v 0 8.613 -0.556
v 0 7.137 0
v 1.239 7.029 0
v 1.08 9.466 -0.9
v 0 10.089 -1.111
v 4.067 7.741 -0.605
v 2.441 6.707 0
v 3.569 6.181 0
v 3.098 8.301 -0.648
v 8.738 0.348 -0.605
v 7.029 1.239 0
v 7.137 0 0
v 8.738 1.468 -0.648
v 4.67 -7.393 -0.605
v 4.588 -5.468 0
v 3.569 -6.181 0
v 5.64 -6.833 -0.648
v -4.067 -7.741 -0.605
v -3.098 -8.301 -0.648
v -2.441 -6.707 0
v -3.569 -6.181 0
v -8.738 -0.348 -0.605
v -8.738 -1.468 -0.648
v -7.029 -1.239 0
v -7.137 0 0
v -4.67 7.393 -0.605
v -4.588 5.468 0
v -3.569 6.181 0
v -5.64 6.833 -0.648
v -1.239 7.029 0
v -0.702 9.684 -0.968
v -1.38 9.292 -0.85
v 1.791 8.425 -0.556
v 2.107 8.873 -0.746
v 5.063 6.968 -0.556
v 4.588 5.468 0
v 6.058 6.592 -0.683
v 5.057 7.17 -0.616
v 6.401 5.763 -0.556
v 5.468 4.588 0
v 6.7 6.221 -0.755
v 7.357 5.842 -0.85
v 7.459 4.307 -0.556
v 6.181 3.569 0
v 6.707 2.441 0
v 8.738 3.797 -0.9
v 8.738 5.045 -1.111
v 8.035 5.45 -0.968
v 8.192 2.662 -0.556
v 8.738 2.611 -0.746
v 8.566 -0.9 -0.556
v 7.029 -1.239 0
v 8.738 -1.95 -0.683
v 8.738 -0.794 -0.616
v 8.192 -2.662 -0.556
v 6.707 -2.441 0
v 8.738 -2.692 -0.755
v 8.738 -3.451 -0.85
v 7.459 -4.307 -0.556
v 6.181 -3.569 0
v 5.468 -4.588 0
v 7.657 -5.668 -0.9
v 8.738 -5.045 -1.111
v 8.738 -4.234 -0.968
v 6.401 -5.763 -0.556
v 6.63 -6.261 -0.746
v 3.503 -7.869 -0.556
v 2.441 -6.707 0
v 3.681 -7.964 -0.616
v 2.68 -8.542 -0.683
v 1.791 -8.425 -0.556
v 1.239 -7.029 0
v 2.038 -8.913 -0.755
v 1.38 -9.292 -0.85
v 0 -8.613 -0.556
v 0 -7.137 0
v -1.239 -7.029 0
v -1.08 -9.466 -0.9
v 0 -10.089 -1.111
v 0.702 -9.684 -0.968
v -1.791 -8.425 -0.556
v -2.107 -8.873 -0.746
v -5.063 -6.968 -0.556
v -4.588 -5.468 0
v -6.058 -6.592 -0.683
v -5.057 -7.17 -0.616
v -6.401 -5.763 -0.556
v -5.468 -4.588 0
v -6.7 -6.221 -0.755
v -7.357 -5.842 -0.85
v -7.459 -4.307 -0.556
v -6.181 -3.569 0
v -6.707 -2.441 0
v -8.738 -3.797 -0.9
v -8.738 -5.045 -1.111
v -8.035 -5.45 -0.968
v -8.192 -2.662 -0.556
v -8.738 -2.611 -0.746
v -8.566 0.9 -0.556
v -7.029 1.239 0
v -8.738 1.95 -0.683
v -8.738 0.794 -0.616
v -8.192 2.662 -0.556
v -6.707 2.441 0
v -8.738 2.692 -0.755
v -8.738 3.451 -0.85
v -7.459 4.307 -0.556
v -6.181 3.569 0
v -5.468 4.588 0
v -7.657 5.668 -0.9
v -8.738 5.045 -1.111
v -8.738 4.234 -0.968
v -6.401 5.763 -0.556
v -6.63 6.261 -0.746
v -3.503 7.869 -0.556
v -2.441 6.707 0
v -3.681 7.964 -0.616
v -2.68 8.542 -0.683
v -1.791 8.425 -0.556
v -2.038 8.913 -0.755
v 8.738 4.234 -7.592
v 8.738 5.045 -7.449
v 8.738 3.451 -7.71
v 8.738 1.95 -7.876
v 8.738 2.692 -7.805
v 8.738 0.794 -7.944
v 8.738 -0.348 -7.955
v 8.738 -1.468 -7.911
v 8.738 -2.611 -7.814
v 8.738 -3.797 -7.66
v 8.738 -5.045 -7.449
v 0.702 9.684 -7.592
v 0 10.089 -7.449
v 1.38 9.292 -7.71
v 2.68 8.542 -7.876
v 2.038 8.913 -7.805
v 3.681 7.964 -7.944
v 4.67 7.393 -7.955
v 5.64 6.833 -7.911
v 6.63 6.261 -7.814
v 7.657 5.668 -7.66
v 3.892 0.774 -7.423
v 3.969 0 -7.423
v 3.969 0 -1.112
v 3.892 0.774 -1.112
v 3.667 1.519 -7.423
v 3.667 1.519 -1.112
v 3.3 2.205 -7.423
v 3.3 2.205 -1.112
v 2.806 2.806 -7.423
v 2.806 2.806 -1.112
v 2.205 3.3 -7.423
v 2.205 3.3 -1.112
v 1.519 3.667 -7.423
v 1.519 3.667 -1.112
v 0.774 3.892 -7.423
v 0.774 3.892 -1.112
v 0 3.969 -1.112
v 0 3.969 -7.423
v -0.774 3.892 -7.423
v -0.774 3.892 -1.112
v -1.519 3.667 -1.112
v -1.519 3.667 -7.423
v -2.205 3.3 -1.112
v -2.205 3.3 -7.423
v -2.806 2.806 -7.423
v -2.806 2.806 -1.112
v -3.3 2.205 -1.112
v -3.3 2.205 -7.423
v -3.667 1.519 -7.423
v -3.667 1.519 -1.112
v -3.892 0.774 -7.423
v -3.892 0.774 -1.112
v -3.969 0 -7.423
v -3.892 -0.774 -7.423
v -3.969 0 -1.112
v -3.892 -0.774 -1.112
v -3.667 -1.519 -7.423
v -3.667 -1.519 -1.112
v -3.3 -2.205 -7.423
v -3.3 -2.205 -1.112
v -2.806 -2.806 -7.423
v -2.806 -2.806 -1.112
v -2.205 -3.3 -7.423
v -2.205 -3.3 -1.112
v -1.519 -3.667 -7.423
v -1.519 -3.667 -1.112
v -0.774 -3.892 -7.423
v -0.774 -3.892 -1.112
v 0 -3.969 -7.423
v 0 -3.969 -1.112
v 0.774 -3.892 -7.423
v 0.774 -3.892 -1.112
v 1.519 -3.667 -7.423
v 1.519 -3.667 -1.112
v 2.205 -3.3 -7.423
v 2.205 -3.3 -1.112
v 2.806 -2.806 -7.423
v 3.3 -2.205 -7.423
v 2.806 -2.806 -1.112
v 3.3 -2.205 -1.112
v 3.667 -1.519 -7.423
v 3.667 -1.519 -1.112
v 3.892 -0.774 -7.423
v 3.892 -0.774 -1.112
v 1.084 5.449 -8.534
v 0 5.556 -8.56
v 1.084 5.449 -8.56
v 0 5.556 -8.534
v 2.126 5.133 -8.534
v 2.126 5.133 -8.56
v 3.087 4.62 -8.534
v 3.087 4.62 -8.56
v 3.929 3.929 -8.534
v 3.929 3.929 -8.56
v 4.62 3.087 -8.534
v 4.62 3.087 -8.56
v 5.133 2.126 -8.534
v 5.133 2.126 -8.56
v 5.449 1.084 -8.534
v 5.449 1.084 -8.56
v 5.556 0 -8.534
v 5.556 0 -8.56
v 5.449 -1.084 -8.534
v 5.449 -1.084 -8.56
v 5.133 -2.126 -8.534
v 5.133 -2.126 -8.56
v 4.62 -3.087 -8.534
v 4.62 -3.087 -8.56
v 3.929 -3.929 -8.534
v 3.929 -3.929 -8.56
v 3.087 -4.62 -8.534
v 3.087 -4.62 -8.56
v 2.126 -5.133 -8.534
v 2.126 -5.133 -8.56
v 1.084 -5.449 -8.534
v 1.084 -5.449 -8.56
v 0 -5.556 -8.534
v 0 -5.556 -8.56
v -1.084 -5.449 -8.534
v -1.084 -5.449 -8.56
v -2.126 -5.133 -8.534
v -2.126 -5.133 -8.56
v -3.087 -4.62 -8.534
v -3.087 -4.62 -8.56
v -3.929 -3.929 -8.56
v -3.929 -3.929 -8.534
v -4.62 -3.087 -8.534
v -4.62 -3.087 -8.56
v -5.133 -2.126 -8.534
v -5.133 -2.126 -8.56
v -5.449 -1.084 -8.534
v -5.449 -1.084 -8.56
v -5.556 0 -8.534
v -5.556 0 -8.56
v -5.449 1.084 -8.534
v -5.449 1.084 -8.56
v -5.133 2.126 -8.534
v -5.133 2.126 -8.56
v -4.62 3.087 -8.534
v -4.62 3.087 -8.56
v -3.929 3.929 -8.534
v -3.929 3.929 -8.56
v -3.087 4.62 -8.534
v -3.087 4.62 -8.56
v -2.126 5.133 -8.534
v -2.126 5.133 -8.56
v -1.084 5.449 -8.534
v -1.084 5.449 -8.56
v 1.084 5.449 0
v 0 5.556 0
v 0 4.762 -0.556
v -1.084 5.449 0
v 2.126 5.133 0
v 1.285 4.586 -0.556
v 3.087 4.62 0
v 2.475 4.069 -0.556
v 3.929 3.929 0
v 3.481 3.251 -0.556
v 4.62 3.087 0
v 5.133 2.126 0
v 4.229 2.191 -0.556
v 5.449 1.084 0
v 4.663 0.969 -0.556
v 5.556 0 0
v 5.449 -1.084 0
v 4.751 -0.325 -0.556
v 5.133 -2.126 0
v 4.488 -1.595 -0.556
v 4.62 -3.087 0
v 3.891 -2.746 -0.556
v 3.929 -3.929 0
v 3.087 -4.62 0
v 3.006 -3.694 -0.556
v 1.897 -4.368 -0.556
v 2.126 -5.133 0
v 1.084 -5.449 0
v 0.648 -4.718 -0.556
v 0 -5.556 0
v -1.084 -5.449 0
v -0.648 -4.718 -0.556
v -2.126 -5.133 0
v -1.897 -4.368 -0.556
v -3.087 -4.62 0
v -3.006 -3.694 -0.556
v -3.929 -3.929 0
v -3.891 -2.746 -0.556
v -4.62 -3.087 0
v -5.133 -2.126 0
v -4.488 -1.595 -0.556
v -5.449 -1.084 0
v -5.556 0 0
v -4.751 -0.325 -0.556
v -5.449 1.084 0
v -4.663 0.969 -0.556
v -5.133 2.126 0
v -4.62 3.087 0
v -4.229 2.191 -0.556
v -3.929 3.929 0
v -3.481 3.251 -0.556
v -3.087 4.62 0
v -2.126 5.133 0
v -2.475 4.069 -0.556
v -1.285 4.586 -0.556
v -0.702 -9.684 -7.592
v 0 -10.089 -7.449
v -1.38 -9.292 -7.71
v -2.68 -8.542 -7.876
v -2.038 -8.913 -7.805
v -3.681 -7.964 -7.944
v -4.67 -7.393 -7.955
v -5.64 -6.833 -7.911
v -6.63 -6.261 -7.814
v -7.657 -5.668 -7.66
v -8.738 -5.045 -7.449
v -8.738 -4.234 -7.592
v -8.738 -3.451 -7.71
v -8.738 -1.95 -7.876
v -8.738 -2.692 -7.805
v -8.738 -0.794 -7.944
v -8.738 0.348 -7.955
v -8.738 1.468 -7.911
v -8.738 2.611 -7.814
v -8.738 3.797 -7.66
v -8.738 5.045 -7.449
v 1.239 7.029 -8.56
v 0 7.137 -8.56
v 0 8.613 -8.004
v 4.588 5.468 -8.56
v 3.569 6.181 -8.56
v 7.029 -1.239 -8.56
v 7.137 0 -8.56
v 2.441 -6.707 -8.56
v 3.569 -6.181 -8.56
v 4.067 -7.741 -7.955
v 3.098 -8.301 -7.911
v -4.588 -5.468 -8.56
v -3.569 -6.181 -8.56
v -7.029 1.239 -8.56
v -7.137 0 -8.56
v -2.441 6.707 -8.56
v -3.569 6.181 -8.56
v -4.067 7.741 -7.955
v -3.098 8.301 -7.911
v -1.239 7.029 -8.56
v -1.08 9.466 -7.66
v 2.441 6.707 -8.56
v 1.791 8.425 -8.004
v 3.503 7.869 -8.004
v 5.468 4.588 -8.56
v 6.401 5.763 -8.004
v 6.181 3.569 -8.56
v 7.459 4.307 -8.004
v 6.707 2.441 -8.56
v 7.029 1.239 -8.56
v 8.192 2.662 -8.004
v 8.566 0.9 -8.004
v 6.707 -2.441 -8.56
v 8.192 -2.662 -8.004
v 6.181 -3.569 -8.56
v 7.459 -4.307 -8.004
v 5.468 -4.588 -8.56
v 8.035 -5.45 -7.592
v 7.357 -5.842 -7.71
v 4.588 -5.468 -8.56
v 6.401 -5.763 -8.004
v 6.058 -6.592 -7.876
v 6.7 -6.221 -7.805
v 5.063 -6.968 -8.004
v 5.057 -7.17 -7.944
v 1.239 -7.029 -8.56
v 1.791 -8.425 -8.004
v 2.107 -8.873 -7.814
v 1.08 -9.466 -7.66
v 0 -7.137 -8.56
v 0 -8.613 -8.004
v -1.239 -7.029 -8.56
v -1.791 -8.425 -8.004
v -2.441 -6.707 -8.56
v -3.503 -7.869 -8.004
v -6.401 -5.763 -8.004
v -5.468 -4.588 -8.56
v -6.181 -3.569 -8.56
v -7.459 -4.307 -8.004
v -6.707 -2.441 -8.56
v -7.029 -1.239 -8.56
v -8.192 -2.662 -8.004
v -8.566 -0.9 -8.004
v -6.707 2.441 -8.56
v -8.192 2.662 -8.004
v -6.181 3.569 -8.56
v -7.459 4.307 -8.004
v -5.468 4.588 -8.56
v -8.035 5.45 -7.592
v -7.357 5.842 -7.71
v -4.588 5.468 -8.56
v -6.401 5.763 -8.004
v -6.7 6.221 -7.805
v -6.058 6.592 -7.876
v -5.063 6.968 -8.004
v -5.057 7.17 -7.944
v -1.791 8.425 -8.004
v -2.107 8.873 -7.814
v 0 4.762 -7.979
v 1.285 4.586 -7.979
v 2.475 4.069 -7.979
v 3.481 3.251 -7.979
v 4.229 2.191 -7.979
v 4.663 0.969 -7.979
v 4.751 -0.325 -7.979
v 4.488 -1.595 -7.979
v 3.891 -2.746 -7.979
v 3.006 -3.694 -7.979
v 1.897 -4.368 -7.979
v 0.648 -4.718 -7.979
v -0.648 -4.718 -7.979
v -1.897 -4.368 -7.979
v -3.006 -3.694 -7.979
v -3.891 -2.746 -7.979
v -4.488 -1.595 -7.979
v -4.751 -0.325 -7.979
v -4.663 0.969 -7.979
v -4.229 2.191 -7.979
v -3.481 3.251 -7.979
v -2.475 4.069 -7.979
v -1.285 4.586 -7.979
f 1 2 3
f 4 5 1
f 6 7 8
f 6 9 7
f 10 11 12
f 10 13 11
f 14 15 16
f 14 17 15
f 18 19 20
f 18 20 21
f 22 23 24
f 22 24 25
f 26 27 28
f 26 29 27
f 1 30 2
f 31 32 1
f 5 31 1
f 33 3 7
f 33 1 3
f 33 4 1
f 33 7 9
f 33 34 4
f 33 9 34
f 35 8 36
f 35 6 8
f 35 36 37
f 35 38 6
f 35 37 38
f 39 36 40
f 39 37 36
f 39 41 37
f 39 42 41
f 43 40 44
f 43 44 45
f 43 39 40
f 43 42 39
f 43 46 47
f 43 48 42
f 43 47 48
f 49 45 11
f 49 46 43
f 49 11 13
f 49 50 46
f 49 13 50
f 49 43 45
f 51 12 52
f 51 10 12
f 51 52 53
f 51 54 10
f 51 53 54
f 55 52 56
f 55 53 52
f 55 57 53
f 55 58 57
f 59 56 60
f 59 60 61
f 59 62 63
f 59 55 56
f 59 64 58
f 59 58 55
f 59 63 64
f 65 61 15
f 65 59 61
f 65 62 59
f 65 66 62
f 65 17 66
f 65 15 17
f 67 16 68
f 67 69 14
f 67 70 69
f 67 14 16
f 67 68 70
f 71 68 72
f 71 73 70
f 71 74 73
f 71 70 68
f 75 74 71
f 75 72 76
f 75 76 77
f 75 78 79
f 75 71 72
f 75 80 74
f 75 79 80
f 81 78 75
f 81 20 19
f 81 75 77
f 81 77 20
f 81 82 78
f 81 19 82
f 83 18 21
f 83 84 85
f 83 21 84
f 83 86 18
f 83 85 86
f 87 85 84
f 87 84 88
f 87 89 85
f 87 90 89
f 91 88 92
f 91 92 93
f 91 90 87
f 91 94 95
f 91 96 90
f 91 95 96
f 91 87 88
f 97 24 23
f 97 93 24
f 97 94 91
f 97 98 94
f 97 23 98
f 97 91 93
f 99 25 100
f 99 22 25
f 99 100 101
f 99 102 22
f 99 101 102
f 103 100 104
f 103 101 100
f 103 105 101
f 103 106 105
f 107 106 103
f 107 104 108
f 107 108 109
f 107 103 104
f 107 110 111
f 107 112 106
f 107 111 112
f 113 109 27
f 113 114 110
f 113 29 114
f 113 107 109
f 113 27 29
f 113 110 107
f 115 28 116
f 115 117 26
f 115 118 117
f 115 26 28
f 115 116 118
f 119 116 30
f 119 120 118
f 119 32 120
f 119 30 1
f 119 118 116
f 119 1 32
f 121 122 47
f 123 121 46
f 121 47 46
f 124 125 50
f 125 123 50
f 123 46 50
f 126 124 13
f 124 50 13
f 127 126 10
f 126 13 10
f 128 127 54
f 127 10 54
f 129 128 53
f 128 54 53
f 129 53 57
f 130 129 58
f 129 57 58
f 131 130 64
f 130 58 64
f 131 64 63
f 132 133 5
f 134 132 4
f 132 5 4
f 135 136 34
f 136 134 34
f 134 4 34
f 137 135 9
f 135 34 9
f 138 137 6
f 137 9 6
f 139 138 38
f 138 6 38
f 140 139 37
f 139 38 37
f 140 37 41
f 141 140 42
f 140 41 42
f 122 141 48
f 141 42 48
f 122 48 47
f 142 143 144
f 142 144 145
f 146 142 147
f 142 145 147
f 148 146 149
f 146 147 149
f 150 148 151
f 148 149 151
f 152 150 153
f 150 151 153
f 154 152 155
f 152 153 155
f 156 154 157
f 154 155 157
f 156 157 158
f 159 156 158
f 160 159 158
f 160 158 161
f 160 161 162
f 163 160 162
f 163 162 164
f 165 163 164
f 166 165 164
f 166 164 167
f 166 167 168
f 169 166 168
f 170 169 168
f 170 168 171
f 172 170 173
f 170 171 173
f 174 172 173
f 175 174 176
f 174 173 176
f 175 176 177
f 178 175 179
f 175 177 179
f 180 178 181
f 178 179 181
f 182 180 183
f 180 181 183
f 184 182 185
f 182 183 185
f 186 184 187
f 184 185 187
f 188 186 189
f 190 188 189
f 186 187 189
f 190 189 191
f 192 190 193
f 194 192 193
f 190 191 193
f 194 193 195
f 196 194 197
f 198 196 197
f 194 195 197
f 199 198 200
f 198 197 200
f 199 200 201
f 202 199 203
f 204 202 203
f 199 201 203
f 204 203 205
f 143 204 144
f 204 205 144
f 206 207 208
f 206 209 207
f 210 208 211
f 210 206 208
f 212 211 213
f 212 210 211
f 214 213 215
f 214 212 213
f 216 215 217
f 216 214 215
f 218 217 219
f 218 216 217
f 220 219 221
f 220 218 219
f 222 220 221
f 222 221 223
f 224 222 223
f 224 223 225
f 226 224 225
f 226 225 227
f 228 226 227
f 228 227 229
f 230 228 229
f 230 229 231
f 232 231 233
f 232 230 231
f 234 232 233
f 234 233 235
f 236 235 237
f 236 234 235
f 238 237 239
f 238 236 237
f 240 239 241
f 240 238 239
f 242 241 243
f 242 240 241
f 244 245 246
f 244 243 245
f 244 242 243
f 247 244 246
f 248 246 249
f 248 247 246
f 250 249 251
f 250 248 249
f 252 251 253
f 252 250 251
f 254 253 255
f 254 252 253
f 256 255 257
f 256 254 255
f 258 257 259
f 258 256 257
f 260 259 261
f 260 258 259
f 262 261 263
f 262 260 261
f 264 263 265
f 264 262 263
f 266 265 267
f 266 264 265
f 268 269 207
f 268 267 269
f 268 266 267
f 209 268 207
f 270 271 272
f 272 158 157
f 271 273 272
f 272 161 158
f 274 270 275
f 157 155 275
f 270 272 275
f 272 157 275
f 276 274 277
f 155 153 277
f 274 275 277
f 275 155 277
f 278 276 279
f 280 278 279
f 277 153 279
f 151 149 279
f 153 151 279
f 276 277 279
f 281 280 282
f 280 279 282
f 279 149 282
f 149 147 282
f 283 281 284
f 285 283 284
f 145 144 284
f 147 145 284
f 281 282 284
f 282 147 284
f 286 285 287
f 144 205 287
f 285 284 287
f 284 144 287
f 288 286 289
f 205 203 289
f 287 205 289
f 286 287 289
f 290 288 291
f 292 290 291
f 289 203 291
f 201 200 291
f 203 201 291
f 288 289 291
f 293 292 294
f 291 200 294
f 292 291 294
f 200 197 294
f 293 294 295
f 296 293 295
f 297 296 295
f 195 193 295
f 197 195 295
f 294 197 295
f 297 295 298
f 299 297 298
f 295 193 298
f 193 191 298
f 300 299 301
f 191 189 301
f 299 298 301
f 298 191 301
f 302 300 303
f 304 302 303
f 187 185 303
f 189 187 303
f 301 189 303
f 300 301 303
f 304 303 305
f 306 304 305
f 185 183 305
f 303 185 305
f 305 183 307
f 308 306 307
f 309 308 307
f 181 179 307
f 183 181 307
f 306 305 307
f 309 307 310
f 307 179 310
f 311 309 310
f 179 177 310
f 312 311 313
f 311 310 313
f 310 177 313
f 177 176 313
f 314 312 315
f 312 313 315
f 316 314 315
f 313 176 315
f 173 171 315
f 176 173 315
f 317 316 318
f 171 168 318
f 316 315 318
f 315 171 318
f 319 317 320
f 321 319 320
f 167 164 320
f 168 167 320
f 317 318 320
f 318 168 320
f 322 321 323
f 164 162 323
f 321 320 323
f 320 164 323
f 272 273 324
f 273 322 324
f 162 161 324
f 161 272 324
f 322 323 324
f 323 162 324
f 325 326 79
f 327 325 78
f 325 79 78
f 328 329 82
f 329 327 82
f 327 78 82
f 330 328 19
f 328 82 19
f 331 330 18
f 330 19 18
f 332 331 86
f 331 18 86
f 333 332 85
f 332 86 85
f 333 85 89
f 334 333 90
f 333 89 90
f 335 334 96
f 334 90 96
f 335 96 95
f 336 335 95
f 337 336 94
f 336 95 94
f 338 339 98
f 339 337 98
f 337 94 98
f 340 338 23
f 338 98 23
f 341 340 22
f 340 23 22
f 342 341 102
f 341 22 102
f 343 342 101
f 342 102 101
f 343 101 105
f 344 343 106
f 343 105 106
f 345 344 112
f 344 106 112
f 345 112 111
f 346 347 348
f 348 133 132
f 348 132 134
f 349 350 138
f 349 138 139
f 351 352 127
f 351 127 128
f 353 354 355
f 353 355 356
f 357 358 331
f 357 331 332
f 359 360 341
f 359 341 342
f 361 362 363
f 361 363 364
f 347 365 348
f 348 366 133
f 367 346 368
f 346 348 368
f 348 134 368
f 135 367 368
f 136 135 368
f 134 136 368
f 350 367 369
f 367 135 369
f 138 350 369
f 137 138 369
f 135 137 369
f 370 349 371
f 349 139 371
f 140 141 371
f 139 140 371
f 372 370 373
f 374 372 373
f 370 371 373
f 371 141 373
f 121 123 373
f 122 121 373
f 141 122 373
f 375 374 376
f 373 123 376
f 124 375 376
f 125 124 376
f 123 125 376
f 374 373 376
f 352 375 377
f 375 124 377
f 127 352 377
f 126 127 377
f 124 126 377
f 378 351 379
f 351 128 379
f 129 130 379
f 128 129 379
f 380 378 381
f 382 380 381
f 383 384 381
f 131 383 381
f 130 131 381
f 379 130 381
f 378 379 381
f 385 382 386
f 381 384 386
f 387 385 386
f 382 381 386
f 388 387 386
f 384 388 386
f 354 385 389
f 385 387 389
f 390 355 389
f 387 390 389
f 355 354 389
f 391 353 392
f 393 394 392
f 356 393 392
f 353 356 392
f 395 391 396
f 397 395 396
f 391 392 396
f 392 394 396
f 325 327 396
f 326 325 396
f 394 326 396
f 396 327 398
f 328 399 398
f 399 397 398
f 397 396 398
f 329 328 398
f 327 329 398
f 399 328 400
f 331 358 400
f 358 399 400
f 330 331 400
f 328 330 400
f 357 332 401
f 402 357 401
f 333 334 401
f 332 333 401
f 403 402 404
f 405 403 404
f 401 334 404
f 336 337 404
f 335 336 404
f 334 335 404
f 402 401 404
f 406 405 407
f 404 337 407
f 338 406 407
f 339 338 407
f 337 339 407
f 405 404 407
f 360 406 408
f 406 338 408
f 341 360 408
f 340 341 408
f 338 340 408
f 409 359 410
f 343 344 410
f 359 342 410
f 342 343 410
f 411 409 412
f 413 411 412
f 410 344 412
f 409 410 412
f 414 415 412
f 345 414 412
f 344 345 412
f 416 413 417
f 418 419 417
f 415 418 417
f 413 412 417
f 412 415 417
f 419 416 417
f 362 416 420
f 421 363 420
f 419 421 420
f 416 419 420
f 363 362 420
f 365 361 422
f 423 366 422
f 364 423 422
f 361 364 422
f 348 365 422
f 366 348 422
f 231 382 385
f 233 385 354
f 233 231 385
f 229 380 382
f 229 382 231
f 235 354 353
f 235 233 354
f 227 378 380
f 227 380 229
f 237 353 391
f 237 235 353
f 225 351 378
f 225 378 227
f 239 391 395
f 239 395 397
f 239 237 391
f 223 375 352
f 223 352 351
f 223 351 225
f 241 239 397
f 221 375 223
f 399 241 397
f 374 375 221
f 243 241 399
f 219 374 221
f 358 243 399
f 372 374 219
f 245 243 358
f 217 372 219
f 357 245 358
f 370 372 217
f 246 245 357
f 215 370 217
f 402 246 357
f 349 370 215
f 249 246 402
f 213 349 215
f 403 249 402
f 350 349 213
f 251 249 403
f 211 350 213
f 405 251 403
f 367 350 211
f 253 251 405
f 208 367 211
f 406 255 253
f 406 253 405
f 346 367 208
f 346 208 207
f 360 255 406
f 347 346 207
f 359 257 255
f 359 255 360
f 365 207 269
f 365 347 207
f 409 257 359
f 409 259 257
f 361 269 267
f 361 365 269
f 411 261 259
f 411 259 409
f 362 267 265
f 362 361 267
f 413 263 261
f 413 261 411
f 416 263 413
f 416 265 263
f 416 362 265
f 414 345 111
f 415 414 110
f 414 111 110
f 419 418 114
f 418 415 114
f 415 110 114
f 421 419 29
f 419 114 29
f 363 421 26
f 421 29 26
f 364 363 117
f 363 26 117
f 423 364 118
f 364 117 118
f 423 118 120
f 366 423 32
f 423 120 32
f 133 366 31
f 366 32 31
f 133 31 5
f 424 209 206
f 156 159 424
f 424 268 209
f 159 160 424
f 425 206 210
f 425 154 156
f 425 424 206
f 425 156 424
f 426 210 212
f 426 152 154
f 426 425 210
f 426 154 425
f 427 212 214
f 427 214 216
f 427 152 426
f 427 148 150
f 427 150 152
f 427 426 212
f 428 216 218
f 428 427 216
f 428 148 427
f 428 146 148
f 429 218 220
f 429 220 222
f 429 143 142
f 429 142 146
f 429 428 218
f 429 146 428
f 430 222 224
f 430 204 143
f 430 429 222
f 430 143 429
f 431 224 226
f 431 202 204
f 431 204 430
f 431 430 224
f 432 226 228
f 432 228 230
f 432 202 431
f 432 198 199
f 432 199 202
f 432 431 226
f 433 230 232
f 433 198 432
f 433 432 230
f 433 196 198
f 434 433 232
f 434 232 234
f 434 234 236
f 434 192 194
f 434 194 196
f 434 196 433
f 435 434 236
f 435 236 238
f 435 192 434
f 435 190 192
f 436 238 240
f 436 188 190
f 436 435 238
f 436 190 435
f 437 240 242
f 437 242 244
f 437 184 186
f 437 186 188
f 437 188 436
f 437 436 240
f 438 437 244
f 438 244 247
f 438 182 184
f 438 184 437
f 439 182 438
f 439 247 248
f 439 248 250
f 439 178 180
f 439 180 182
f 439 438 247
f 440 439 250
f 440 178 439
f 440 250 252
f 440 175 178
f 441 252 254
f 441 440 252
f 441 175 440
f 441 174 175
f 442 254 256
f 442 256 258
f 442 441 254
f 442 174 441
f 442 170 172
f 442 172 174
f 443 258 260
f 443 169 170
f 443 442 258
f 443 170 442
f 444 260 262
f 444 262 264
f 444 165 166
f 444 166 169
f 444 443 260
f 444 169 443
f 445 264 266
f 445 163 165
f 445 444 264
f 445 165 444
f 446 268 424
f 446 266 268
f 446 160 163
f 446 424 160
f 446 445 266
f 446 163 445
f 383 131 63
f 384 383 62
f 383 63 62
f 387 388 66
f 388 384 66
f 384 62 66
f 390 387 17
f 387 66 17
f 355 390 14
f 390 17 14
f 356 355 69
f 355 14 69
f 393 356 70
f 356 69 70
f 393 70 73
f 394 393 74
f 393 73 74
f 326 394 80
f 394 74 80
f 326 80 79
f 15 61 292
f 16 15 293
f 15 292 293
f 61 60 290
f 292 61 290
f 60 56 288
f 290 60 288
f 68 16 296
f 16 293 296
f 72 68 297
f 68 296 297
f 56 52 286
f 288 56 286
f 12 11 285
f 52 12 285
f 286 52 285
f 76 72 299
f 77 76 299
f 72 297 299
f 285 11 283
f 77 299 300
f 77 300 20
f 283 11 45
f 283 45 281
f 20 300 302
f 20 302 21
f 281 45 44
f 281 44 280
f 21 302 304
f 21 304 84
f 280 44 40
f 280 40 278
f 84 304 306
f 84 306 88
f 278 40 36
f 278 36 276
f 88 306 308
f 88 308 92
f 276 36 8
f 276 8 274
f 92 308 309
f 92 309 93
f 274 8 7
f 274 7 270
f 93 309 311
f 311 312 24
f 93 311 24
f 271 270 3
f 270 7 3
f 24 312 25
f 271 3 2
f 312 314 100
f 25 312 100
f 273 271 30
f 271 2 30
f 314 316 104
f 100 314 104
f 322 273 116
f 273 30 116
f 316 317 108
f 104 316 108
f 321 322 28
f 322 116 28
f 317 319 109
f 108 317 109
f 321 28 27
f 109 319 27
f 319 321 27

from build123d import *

# Parameters (mm, degrees)
BASENUTSKE_R  = 3.96875
BASENUT_DEPTH = 8.5598


with BuildPart() as part:
    # BaseNutSke → BaseNut (new body)
    with BuildSketch(Plane.XY):
        Polygon((8.7376, 5.044655712), (8.7376, -5.044655712), (0, -10.089311424), (-8.7376, -5.044655712), (-8.7376, 5.044655712), (0, 10.089311424), align=None)
        Circle(BASENUTSKE_R, mode=Mode.SUBTRACT)
    extrude(amount=-BASENUT_DEPTH)

    # Sketch3 → Double-Chamfer (revolve, cut)
    with BuildSketch(Plane(origin=(0, 0, 0), x_dir=(0, 0, -1), z_dir=(1, 0, 0))):
        Polygon((8.5598, 7.1374), (7.44855, 10.089311424), (7.44855, 22.789311424), (21.2598, 22.789311424), (21.2598, 7.1374), align=None)
        Polygon((1.11125, 22.789311424), (-12.7, 22.789311424), (-12.7, 7.1374), (0, 7.1374), (1.11125, 10.089311424), align=None)
    revolve(axis=Axis((0, 0, 0), (0, 0, -1)), mode=Mode.SUBTRACT)

    # Sketch5 → EndChamfer (revolve, cut)
    with BuildSketch(Plane(origin=(0, 0, 0), x_dir=(0, 0, -1), z_dir=(1, 0, 0))):
        Polygon((8.5344, 5.55625), (7.311662586, 3.81), (8.5852, 3.81), (8.5852, 5.55625), align=None)
        Polygon((-0.0508, 5.55625), (0, 5.55625), (1.222737414, 3.81), (-0.0508, 3.81), align=None)
    revolve(axis=Axis((0, 0, -25.037505729), (0, 0, -1)), mode=Mode.SUBTRACT)


solid = part.part
